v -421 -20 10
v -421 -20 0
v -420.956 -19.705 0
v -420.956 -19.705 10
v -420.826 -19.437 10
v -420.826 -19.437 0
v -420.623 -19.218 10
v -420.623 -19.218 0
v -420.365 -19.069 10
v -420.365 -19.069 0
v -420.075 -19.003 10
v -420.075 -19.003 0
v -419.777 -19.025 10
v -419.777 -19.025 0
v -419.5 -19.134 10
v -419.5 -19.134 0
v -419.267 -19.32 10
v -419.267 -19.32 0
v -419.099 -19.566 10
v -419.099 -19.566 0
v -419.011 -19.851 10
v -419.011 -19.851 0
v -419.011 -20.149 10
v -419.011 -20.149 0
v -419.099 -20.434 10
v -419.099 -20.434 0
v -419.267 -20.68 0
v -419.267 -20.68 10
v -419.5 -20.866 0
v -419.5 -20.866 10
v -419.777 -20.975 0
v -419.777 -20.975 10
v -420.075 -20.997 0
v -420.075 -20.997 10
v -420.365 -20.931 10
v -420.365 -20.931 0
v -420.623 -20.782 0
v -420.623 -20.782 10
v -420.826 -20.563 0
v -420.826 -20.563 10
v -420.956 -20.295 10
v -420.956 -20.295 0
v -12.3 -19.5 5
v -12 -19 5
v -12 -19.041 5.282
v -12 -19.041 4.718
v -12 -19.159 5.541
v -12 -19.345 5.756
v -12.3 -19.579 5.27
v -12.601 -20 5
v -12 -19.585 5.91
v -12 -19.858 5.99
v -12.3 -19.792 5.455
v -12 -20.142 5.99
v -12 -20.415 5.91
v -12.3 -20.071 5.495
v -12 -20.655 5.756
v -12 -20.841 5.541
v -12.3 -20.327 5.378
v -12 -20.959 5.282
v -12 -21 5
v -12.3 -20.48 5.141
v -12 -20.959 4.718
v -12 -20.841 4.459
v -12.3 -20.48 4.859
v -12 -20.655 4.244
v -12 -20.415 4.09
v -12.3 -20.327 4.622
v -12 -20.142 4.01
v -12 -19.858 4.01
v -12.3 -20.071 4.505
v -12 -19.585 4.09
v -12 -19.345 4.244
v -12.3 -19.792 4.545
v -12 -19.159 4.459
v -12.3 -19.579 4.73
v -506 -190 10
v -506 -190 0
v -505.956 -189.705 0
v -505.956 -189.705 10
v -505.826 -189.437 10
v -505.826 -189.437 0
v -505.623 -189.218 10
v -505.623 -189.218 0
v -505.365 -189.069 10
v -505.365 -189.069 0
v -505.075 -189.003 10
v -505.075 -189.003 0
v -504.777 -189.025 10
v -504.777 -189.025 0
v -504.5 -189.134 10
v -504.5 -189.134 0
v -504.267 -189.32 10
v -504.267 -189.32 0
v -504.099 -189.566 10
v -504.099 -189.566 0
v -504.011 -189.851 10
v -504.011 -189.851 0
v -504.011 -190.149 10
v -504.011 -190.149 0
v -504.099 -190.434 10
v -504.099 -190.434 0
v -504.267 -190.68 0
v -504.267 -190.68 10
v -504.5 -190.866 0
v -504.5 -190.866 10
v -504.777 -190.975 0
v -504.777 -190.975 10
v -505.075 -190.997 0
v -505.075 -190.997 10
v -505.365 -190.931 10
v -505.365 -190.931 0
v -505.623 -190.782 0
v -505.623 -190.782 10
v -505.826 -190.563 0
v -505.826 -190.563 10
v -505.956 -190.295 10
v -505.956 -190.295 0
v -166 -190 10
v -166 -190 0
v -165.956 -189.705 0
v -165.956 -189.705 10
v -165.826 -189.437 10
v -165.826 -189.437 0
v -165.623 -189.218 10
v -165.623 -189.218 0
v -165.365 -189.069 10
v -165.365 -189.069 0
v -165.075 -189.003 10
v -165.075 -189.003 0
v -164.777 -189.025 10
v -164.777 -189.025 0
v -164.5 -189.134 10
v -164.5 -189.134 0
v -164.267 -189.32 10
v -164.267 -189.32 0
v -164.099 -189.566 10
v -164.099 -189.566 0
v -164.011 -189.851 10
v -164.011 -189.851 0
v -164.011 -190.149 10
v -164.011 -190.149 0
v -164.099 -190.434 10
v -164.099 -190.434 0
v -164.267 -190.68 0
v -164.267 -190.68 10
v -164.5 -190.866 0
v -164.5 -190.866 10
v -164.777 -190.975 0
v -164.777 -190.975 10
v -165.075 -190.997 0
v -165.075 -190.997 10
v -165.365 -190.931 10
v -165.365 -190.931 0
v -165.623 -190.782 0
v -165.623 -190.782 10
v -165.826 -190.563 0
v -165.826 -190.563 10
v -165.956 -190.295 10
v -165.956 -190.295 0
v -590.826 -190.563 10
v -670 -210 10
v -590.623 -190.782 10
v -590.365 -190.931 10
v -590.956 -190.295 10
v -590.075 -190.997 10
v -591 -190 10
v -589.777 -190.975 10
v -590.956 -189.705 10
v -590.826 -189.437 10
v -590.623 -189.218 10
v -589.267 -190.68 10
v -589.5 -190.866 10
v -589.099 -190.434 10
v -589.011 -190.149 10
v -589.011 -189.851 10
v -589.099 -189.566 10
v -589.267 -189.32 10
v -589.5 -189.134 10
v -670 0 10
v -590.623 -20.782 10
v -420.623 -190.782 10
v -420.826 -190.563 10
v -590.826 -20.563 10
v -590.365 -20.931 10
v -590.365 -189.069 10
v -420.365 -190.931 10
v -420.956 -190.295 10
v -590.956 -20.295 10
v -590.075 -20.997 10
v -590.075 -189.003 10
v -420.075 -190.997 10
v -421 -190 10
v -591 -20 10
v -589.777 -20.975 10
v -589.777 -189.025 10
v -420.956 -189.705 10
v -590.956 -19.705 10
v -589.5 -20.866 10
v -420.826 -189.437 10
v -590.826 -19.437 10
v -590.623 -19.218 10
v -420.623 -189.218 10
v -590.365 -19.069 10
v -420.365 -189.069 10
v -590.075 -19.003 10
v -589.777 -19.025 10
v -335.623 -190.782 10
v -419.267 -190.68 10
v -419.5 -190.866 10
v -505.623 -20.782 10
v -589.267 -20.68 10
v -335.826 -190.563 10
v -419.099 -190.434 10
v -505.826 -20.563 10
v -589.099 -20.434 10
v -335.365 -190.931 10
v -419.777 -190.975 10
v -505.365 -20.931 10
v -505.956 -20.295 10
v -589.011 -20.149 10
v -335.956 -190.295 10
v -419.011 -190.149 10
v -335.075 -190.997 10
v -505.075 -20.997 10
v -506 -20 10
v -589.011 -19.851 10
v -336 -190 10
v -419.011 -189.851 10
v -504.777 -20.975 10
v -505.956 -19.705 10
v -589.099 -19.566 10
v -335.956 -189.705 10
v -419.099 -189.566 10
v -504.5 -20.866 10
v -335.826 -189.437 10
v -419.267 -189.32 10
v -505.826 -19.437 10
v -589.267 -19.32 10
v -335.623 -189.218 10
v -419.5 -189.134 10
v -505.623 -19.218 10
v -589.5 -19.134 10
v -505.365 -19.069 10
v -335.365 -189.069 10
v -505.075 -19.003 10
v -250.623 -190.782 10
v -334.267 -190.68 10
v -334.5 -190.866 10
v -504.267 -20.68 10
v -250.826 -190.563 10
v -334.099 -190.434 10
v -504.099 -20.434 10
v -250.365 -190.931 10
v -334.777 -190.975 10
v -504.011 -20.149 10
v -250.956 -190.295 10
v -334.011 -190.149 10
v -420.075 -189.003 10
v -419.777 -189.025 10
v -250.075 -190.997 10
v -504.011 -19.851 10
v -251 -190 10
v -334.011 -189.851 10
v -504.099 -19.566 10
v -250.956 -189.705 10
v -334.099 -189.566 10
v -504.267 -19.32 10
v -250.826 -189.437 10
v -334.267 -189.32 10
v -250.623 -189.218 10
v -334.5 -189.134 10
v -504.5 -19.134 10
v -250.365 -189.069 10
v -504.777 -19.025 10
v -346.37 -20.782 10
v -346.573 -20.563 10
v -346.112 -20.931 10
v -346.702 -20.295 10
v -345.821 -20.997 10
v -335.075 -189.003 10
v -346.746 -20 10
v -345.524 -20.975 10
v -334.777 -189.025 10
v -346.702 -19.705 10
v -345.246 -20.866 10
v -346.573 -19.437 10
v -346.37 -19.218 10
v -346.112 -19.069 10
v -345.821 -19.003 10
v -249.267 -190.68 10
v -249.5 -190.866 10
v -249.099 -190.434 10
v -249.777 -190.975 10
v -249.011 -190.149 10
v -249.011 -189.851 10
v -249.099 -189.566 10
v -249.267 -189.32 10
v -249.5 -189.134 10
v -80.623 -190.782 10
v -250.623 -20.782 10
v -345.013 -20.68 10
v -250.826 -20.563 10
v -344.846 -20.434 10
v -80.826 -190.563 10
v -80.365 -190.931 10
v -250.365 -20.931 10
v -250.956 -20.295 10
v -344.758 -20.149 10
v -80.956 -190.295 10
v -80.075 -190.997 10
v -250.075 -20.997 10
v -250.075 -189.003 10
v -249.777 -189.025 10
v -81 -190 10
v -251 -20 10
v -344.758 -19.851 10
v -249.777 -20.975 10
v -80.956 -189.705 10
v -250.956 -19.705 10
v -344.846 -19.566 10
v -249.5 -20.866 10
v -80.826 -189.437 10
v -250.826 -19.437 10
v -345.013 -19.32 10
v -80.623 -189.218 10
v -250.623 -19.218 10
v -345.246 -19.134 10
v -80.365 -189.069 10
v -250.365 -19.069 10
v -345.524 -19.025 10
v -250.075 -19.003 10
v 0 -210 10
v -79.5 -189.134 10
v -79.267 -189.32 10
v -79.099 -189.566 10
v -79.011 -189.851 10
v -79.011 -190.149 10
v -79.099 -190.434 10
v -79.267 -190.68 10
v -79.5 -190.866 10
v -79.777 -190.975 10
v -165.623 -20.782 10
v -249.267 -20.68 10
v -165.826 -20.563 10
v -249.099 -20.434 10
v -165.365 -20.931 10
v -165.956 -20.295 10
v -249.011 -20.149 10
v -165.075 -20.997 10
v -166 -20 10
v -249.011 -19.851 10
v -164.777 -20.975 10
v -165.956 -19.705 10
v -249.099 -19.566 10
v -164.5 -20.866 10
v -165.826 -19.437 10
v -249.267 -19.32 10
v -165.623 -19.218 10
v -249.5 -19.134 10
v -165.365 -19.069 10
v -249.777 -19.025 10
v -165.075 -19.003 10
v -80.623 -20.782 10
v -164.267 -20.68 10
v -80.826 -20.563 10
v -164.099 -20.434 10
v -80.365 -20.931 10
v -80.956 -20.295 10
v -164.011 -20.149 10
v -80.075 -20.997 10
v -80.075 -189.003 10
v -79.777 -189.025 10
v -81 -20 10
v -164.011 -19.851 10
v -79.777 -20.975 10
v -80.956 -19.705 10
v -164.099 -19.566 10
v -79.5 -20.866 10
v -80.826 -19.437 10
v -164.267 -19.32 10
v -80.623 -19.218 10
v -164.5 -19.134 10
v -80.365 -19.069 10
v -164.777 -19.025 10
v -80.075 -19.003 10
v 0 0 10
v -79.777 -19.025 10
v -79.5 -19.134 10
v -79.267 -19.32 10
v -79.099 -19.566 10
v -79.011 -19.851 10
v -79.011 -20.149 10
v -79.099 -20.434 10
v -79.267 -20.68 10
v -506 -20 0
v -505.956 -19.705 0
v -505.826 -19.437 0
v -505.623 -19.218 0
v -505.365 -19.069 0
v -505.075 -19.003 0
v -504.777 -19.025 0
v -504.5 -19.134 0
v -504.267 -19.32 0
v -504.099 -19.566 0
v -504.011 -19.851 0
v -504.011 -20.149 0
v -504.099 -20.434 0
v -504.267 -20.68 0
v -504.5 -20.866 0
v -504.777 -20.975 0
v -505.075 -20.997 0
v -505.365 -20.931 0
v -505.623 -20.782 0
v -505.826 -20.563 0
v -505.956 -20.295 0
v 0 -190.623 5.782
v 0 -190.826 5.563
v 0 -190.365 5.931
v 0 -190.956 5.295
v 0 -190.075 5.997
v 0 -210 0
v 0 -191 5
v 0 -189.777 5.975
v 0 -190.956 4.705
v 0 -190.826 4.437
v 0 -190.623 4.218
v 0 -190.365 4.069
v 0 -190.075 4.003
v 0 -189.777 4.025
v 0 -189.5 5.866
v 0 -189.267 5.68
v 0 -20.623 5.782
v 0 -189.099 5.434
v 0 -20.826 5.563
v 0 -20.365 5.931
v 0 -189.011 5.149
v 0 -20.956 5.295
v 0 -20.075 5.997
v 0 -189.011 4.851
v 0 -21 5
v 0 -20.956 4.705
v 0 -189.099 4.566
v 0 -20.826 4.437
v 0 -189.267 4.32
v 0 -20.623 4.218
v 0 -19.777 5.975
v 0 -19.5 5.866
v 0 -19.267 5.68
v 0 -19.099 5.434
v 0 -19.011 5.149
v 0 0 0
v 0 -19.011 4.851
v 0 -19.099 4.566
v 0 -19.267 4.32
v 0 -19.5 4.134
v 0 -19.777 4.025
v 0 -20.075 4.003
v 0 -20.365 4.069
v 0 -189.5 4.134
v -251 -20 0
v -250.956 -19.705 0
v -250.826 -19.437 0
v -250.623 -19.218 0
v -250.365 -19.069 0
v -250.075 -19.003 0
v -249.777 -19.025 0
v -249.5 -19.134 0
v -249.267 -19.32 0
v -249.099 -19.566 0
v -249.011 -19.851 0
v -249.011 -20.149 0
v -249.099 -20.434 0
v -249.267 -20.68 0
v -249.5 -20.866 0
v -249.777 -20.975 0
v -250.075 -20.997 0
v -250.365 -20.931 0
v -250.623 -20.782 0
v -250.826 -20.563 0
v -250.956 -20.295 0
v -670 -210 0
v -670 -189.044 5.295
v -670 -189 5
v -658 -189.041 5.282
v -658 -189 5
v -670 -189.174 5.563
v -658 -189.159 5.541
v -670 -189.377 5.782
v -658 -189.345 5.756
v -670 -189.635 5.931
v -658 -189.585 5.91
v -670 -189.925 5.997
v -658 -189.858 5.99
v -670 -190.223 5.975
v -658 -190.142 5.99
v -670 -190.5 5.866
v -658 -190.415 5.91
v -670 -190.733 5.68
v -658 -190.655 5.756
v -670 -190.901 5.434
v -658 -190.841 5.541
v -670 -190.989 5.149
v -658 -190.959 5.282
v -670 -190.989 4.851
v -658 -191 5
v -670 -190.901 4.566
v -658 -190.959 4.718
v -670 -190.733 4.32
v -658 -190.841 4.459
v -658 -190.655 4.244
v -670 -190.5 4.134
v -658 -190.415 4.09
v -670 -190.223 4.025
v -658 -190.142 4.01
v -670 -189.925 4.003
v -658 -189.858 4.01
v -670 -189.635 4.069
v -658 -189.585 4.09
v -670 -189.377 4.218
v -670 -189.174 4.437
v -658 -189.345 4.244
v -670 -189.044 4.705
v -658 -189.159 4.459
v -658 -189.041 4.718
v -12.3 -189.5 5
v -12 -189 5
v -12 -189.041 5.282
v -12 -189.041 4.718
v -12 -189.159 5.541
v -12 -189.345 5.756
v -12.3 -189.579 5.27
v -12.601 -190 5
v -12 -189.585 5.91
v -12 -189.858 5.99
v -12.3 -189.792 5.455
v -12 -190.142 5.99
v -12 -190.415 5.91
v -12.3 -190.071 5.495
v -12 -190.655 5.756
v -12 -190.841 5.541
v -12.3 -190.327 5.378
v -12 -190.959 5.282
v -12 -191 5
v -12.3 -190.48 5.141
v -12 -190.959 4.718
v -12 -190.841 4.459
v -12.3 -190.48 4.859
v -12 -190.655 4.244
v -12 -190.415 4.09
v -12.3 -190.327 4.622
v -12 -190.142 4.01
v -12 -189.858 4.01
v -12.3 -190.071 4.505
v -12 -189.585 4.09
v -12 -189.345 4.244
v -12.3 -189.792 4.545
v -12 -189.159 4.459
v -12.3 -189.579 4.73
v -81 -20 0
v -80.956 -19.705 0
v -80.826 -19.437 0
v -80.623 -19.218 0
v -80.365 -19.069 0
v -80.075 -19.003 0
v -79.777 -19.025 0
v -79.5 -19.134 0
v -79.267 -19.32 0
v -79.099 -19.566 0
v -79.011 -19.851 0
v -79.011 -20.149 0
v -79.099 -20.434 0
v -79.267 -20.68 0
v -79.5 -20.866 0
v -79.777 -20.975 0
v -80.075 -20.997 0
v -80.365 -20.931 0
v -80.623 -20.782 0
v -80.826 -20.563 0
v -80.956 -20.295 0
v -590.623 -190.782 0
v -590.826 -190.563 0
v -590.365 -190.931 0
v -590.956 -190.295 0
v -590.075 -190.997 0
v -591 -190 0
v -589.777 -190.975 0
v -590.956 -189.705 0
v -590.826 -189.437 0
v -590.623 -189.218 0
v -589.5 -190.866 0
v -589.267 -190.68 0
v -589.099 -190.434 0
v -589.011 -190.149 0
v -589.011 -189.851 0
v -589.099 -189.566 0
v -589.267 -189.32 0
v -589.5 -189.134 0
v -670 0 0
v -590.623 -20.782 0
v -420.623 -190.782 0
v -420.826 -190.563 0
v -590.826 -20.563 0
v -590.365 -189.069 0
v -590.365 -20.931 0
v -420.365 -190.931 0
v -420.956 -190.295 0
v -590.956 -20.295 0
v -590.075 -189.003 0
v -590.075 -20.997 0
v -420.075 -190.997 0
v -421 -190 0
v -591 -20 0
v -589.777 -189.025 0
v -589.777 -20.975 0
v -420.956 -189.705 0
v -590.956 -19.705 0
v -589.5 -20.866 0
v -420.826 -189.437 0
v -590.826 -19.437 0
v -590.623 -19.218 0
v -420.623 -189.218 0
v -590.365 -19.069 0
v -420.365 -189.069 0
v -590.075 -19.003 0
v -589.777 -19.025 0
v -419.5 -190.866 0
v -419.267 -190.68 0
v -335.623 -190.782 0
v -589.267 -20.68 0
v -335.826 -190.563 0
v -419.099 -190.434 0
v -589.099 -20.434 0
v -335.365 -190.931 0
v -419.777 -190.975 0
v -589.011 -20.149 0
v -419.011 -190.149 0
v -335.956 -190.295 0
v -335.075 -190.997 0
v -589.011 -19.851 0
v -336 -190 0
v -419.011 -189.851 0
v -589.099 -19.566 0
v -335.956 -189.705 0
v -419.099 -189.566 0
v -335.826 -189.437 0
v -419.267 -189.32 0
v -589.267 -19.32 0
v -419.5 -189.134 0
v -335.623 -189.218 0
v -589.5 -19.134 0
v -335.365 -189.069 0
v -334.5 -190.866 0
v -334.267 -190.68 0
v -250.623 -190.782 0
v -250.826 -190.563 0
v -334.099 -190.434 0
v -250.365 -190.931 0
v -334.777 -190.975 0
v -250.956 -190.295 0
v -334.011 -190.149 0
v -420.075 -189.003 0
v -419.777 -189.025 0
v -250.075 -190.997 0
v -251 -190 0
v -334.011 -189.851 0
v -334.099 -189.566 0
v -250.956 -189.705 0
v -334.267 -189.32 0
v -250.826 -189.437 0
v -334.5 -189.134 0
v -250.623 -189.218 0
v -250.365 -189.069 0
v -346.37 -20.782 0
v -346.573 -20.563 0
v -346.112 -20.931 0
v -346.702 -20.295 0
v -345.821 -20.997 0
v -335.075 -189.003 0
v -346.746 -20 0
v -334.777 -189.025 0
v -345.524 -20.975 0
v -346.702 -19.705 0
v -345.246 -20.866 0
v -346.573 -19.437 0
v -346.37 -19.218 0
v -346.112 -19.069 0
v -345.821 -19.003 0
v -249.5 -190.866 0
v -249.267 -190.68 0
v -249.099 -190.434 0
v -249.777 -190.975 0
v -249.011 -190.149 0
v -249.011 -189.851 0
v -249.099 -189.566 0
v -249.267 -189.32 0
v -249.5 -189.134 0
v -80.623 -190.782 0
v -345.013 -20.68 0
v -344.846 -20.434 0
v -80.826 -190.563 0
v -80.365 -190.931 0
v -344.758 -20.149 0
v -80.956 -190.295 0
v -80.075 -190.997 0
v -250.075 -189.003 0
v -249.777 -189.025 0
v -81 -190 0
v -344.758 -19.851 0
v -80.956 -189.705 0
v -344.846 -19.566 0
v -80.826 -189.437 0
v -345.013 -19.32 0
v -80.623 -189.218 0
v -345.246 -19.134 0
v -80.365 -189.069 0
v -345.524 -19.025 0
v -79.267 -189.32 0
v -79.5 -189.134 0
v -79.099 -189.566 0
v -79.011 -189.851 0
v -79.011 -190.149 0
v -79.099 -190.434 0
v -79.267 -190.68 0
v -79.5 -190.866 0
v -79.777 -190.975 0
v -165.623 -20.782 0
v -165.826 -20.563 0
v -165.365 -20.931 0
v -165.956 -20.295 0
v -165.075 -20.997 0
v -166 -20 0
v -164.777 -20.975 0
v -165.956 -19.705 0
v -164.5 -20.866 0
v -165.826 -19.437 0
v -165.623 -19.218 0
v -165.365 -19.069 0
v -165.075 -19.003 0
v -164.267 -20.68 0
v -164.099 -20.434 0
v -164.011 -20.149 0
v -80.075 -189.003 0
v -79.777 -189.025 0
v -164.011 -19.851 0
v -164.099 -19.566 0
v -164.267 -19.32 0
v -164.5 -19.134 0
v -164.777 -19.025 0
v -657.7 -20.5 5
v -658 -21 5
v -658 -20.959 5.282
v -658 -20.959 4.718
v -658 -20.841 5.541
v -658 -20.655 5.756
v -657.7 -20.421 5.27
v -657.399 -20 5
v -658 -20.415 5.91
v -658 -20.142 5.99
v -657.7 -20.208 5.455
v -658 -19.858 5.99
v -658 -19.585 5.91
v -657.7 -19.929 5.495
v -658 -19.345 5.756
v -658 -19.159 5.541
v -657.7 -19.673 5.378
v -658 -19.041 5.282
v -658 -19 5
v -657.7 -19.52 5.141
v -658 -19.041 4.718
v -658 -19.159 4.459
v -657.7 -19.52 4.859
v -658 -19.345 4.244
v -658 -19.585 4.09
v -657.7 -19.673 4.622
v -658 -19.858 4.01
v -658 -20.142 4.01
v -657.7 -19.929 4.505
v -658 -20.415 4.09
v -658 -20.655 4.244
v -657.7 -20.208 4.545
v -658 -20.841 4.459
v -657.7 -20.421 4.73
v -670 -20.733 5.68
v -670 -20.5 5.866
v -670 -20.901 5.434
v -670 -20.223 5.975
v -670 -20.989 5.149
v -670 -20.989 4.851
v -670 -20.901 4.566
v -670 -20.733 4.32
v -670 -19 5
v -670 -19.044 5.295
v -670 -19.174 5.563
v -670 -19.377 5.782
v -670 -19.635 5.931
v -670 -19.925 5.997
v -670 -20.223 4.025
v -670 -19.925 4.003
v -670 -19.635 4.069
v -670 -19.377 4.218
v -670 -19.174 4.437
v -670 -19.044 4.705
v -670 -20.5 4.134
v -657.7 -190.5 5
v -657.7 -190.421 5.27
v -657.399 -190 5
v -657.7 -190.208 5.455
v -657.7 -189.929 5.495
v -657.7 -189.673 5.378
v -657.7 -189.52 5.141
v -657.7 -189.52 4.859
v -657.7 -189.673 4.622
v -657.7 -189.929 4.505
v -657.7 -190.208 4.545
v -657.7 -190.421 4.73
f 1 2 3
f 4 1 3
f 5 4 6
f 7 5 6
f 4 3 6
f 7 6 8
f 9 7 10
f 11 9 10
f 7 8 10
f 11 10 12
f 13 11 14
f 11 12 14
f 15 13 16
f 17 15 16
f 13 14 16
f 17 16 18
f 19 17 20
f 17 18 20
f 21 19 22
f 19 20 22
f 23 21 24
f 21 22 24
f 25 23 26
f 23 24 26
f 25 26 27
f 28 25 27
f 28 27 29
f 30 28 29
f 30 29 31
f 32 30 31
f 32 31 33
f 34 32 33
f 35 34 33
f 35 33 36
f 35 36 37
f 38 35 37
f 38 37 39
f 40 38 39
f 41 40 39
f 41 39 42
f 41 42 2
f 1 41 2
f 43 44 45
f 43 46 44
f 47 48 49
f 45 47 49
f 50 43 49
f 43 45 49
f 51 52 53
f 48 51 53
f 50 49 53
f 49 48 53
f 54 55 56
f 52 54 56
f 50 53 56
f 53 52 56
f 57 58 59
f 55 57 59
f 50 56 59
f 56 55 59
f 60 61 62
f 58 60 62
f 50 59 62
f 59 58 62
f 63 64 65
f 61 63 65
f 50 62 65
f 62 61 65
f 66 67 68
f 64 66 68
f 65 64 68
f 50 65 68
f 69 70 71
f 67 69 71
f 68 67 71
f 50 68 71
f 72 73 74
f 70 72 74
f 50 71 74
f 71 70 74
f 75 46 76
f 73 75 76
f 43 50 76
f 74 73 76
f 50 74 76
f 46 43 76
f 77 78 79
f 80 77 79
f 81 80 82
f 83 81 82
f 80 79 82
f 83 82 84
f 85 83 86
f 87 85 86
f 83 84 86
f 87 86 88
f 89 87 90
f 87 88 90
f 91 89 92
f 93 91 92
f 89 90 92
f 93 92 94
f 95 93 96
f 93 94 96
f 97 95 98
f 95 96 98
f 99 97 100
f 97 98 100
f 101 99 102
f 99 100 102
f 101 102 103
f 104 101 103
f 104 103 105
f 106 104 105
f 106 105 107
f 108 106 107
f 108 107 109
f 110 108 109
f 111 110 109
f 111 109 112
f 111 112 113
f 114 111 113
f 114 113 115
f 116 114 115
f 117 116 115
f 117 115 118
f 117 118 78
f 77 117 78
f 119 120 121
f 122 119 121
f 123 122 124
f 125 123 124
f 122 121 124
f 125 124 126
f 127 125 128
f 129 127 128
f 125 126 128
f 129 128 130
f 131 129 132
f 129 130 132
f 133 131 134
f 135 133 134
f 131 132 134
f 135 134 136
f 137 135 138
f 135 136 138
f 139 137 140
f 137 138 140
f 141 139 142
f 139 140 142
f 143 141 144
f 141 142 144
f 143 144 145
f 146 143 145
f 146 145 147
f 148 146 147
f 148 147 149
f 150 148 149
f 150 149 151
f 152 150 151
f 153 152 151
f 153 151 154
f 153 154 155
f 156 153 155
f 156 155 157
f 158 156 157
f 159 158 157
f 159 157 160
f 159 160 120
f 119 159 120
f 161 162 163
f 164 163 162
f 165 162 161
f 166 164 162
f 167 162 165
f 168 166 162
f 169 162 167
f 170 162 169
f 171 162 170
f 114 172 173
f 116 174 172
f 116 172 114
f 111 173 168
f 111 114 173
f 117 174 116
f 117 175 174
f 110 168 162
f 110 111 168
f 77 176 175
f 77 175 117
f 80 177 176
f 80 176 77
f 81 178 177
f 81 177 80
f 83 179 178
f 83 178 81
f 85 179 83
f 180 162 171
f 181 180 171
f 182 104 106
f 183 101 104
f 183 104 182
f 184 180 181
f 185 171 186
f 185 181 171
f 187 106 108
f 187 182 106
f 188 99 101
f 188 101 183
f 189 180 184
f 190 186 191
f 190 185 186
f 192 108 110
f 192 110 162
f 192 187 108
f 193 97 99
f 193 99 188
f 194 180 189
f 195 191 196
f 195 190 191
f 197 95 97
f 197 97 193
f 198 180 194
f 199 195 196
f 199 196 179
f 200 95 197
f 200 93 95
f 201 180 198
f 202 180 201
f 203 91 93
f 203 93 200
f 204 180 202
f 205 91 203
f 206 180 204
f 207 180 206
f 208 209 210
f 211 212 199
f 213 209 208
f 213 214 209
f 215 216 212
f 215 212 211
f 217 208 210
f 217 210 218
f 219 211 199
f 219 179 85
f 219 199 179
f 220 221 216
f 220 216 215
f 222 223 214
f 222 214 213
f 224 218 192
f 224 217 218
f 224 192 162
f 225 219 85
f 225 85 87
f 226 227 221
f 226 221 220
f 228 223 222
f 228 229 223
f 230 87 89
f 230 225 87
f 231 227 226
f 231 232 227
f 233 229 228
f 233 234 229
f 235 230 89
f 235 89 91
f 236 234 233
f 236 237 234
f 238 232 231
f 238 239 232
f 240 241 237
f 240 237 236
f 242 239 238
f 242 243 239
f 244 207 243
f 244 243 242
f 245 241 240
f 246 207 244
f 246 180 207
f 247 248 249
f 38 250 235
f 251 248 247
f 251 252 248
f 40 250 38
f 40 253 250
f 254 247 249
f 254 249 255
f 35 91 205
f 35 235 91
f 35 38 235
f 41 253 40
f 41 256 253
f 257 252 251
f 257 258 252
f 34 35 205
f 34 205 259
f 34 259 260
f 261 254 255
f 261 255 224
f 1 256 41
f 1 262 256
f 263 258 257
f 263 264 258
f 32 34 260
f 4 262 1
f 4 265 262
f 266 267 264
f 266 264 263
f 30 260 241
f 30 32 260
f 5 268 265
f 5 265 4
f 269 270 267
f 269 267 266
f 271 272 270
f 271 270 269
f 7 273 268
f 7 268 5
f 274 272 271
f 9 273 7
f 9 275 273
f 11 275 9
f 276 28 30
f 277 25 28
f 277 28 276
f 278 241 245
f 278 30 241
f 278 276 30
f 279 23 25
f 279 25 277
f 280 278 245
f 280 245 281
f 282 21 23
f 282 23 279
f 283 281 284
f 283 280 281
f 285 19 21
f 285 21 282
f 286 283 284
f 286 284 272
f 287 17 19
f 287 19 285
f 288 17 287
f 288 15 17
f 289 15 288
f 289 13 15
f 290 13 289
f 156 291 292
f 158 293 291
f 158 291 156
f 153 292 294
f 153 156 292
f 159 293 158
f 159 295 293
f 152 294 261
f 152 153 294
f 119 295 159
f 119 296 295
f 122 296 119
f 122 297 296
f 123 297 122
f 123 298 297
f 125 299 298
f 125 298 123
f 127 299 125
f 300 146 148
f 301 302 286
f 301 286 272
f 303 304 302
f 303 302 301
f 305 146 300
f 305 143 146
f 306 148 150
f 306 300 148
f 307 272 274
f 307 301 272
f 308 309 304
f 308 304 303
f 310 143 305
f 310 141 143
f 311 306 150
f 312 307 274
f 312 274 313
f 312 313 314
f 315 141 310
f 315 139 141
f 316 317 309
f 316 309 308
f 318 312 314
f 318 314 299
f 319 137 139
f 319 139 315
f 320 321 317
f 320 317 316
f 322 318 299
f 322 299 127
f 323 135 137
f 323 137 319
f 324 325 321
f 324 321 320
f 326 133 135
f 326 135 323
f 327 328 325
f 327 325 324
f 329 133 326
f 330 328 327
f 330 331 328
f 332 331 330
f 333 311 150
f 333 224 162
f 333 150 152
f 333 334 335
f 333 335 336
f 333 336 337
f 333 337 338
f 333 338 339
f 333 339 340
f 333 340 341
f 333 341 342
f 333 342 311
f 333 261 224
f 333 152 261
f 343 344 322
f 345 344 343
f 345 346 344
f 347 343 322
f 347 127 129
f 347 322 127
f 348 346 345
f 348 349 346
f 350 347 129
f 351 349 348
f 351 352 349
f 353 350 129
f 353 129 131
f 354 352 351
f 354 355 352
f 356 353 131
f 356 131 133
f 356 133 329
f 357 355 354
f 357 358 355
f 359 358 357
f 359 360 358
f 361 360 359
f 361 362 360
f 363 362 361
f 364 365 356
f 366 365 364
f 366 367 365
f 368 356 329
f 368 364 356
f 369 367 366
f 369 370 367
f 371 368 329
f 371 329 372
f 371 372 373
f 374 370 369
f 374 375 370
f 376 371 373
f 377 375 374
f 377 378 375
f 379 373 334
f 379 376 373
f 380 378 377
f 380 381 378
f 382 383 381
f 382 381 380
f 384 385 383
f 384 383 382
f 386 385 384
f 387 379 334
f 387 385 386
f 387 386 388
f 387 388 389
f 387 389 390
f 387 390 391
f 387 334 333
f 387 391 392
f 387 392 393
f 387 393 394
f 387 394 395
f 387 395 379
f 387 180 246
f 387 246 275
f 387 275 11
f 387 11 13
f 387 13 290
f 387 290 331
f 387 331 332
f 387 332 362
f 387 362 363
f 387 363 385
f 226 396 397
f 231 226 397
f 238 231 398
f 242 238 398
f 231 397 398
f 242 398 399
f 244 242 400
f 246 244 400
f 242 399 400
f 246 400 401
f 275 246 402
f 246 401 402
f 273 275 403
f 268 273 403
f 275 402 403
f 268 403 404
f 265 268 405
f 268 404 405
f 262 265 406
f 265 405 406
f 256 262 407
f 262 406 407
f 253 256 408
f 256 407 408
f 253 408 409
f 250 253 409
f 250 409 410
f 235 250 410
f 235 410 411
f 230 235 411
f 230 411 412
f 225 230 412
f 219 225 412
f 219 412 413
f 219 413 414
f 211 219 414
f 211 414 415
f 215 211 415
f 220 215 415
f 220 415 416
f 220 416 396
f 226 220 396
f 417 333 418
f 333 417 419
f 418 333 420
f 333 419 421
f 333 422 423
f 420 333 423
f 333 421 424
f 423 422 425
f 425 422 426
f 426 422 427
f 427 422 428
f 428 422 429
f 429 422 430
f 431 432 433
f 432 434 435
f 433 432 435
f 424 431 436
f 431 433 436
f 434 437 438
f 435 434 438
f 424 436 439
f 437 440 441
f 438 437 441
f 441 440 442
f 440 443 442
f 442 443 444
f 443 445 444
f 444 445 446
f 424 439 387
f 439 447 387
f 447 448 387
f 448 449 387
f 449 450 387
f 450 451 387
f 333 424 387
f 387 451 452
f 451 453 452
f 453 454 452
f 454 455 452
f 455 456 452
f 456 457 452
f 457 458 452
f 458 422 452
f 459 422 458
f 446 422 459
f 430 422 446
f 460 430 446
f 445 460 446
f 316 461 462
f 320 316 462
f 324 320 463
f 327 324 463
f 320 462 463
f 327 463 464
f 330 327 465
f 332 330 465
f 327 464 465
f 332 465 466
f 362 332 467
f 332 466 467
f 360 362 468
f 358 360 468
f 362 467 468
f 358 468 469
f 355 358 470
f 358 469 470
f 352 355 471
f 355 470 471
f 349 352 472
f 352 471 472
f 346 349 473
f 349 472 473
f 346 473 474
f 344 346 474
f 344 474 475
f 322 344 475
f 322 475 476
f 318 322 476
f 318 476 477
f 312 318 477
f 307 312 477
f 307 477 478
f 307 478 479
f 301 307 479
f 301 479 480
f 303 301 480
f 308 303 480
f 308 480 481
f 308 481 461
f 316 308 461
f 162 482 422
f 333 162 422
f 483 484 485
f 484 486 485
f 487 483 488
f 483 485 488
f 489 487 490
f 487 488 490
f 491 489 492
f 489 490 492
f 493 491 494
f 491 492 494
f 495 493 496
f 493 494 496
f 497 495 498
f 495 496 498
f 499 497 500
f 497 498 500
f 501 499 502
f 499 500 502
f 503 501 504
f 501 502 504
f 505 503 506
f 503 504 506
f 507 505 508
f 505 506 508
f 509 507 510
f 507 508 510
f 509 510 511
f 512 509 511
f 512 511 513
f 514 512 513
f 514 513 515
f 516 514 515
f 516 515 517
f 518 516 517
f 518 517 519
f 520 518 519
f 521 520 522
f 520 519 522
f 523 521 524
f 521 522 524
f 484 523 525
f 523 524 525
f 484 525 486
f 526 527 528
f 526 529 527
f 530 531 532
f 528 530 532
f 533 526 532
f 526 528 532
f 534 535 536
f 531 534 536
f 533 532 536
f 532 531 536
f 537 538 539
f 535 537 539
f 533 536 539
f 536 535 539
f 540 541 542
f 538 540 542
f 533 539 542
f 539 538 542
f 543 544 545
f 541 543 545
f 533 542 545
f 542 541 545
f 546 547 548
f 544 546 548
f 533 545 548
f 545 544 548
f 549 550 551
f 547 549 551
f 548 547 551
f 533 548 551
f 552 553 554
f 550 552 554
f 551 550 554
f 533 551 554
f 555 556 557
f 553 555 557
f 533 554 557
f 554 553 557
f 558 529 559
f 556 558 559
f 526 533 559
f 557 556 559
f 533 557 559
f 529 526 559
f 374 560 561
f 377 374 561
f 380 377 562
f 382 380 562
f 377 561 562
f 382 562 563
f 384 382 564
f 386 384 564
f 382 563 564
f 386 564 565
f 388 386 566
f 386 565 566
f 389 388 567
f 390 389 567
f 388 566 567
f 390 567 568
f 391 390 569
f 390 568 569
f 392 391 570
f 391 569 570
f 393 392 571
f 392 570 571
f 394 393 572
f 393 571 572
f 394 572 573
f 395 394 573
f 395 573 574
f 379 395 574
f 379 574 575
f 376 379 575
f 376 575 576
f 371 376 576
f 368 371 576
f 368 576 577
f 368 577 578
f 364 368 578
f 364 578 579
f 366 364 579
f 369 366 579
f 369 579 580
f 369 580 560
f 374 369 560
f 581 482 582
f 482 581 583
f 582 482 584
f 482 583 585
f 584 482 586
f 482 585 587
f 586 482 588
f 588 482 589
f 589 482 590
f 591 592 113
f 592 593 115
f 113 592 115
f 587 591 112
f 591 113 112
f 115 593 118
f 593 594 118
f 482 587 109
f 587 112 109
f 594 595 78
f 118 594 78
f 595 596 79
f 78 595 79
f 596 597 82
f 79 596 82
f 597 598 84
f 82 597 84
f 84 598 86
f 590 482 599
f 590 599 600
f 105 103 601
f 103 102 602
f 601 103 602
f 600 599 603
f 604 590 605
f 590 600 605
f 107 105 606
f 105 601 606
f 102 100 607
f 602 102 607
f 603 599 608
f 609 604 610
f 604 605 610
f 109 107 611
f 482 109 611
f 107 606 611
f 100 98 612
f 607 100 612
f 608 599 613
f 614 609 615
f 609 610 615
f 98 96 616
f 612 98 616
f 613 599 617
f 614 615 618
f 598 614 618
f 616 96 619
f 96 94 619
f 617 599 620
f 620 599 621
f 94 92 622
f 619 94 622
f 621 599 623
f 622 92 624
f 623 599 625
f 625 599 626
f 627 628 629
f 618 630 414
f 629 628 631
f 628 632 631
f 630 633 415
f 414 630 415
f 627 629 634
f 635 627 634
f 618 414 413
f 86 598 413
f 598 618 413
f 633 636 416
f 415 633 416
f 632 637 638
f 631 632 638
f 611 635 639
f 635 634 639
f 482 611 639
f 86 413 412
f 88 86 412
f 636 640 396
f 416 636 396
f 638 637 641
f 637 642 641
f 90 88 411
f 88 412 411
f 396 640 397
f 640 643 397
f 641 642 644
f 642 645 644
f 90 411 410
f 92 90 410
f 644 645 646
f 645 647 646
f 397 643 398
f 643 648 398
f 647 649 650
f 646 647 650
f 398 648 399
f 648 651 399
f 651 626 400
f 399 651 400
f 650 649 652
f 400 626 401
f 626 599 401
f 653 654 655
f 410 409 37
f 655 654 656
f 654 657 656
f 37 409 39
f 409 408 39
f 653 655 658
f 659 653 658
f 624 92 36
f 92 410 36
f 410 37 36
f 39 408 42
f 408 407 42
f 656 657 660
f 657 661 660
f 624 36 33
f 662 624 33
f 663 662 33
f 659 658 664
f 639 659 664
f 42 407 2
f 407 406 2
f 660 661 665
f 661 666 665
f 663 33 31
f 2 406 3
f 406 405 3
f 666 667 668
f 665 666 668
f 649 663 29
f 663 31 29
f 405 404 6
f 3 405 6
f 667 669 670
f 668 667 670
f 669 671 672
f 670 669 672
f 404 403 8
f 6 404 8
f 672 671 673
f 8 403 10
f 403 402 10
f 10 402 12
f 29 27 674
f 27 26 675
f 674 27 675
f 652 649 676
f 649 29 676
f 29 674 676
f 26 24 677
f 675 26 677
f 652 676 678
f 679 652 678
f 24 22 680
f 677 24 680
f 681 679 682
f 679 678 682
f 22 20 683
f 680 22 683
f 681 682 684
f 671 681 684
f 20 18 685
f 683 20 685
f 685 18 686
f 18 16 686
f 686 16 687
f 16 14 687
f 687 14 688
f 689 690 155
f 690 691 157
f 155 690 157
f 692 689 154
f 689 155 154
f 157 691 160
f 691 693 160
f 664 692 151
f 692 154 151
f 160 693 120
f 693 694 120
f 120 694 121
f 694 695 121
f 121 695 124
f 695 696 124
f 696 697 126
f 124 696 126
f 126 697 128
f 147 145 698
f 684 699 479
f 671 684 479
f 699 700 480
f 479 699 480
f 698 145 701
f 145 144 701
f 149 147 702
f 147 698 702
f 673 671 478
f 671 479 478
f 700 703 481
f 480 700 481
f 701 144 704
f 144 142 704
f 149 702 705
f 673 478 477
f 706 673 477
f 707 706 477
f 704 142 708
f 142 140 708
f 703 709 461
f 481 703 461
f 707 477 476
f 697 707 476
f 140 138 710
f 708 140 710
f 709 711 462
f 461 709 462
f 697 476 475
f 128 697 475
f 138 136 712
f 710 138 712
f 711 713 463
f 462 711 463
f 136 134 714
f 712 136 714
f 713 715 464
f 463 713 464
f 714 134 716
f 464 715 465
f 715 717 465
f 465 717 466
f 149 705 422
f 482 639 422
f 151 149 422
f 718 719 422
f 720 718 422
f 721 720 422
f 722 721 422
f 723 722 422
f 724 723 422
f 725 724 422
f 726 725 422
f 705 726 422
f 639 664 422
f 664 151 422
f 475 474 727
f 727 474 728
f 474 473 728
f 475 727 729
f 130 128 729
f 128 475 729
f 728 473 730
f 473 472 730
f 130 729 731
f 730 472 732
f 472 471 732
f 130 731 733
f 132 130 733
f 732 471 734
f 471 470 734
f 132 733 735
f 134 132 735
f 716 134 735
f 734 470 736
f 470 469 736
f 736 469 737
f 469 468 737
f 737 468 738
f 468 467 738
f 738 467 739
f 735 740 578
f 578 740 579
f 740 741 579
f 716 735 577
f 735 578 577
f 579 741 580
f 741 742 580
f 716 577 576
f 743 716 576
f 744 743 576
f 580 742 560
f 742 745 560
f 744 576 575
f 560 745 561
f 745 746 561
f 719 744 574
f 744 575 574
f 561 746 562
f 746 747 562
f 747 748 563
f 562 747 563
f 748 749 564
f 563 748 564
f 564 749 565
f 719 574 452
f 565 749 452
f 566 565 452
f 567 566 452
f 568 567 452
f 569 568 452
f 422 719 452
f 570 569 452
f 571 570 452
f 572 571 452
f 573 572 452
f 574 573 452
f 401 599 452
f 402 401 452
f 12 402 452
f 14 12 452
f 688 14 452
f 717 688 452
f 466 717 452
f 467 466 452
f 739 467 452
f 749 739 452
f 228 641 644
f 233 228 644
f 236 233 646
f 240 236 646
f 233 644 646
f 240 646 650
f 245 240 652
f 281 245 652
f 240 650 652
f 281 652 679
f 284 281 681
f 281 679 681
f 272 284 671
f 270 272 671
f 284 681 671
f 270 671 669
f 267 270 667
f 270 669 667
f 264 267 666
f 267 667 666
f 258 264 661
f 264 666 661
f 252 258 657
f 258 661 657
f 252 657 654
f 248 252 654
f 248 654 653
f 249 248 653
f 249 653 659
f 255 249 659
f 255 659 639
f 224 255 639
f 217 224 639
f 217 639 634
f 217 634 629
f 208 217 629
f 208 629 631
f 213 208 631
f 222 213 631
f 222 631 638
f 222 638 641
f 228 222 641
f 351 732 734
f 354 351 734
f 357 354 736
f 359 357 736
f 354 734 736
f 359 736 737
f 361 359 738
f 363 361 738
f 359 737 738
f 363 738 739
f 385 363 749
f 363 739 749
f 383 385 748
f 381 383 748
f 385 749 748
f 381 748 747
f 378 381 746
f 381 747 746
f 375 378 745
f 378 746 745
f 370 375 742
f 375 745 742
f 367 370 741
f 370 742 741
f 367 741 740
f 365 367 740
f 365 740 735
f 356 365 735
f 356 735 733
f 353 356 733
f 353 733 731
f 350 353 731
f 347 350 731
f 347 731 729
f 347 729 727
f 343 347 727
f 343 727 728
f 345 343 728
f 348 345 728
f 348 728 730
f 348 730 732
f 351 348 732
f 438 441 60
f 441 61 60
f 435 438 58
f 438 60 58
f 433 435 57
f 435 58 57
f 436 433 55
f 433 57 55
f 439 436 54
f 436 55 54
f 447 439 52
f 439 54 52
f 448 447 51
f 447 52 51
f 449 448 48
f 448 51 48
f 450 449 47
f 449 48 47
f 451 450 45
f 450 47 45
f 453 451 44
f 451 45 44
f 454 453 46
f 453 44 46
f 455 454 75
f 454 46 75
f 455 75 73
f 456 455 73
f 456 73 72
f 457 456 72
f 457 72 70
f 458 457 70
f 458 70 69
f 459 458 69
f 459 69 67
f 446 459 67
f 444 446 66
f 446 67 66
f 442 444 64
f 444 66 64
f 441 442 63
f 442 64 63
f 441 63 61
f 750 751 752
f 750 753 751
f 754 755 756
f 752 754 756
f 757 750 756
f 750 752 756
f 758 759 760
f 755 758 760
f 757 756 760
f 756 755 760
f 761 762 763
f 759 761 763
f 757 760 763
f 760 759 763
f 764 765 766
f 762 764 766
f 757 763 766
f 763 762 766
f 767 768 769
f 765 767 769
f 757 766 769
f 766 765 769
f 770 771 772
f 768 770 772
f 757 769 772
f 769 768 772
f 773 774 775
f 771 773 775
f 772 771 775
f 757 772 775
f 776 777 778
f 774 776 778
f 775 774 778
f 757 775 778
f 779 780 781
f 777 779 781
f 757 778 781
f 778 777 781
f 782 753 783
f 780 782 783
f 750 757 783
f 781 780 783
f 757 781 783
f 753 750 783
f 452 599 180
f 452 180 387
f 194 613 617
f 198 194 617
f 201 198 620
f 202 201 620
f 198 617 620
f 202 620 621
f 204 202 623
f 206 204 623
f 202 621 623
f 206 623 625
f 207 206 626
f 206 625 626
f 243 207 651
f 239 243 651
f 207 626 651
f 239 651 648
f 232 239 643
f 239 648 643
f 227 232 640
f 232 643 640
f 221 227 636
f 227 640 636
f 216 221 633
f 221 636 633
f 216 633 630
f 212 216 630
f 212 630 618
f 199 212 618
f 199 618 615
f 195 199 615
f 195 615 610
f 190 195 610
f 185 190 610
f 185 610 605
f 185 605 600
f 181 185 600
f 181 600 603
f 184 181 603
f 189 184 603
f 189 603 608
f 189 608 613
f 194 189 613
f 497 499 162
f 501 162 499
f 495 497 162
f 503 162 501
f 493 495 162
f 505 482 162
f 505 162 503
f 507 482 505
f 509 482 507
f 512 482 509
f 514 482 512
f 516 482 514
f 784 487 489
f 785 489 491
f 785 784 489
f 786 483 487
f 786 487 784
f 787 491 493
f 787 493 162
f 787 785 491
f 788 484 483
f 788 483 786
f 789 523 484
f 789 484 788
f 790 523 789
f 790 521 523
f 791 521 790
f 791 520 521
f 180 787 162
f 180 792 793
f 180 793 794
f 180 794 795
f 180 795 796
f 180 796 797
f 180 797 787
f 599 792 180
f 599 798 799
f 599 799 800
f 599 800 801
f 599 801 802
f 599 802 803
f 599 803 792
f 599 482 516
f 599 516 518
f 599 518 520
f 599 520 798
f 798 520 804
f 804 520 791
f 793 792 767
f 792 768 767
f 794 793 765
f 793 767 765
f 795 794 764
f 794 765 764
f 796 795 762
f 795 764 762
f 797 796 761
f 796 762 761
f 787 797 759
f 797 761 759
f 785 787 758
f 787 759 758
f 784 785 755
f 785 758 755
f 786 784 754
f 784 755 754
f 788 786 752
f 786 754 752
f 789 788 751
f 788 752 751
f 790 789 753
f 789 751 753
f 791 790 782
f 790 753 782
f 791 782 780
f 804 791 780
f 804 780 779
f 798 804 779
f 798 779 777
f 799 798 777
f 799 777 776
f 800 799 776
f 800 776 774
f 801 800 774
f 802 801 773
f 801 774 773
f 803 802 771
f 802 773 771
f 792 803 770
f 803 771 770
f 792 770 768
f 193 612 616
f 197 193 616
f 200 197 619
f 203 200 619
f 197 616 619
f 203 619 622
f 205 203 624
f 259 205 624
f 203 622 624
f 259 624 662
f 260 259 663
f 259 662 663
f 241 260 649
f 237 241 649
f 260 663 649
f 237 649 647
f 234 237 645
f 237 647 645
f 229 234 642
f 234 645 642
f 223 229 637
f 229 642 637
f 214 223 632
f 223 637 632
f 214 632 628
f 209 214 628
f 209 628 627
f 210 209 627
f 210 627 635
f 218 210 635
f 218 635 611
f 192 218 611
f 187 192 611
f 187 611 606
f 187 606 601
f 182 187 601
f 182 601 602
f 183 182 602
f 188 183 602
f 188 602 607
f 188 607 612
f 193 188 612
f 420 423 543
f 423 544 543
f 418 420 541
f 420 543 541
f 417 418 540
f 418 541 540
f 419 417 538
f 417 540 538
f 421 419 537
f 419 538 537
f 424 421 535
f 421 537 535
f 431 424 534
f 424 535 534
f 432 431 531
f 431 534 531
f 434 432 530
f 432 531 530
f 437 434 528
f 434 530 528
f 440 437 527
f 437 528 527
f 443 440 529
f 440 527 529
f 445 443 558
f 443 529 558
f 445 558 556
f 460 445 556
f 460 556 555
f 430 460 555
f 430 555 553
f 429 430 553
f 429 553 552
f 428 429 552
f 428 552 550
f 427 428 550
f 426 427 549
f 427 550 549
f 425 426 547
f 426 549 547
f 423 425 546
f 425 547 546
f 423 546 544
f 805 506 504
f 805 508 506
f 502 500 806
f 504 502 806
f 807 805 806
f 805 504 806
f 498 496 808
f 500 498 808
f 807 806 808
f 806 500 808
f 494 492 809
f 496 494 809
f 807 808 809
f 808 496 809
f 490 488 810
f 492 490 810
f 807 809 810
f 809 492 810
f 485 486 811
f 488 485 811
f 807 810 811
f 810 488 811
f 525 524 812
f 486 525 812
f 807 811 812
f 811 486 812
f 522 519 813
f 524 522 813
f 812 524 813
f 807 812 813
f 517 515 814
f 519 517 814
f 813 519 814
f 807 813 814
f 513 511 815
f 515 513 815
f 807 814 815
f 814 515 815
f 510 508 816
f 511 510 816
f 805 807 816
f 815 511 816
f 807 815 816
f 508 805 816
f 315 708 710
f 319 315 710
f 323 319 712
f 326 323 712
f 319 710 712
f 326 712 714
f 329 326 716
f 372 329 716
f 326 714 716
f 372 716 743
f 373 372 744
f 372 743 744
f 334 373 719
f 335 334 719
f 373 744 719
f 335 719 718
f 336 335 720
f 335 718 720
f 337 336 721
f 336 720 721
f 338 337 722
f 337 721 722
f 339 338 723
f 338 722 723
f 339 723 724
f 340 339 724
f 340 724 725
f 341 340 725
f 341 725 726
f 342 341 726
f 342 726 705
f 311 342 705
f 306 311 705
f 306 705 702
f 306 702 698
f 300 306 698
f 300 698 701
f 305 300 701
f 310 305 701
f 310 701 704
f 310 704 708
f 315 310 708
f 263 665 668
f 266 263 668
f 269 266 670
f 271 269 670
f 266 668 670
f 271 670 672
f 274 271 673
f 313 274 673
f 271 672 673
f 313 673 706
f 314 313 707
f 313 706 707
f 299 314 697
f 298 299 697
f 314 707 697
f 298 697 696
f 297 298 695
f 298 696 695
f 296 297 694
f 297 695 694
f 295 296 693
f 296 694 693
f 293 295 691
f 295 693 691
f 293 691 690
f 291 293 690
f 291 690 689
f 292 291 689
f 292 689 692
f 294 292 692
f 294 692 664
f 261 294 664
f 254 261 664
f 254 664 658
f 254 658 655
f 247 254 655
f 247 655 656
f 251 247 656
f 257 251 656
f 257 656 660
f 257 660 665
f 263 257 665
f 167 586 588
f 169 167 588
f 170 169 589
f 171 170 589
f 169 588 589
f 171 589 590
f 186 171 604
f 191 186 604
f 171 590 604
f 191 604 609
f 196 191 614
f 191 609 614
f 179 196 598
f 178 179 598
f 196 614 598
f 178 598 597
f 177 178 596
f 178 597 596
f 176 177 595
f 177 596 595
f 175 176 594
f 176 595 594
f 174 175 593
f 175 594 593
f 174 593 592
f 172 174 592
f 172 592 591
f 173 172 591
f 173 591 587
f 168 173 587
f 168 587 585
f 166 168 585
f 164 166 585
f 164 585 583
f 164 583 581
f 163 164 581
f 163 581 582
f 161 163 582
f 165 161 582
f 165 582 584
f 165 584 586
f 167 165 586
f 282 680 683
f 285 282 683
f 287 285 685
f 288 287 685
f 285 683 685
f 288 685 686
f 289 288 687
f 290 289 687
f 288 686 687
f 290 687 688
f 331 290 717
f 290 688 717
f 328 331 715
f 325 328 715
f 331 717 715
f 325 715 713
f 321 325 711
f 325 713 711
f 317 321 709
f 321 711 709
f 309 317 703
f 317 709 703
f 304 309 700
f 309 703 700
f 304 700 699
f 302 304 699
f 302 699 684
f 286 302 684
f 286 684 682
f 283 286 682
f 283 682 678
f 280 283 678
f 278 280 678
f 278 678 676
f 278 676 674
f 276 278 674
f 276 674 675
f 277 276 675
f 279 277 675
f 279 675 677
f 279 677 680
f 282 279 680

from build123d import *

# Parameters (mm, degrees)
F0_W     = 670
F0_H     = 210
F1_DEPTH = 10
F3_D     = 2
F5_D     = 2
F5_DEPTH = 12
F5_TIP   = 0.600860619
F7_D     = 2
F7_DEPTH = 12
F7_TIP   = 0.600860619


with BuildPart() as f1:
    # F0 (on Top) → F1 (new body)
    with BuildSketch(Plane.XY):
        with Locations((-335, -105)):
            Rectangle(F0_W, F0_H)
    extrude(amount=F1_DEPTH)

    # F3 (through all)
    with Locations(Plane.XY.offset(10)):
        with Locations((-590, -190), (-505, -190), (-420, -190), (-335, -190), (-250, -190), (-165, -190), (-80, -190), (-80, -20), (-165, -20), (-250, -20), (-345.7464873791, -20), (-420, -20), (-505, -20), (-590, -20)):
            Hole(F3_D / 2)

    # F5
    with Locations(Plane.YZ):
        with Locations((-190, 5), (-20, 5)):
            Hole(F5_D / 2, depth=F5_DEPTH)
            with Locations((0, 0, -(F5_DEPTH + F5_TIP / 2))):  # 118° drill point
                Cone(0, F5_D / 2, F5_TIP, mode=Mode.SUBTRACT)

    # F7
    with Locations(Plane(origin=(-670, 0, 0), x_dir=(0, -1, 0), z_dir=(-1, 0, 0))):
        with Locations((20, 5), (190, 5)):
            Hole(F7_D / 2, depth=F7_DEPTH)
            with Locations((0, 0, -(F7_DEPTH + F7_TIP / 2))):  # 118° drill point
                Cone(0, F7_D / 2, F7_TIP, mode=Mode.SUBTRACT)


solid = f1.part
